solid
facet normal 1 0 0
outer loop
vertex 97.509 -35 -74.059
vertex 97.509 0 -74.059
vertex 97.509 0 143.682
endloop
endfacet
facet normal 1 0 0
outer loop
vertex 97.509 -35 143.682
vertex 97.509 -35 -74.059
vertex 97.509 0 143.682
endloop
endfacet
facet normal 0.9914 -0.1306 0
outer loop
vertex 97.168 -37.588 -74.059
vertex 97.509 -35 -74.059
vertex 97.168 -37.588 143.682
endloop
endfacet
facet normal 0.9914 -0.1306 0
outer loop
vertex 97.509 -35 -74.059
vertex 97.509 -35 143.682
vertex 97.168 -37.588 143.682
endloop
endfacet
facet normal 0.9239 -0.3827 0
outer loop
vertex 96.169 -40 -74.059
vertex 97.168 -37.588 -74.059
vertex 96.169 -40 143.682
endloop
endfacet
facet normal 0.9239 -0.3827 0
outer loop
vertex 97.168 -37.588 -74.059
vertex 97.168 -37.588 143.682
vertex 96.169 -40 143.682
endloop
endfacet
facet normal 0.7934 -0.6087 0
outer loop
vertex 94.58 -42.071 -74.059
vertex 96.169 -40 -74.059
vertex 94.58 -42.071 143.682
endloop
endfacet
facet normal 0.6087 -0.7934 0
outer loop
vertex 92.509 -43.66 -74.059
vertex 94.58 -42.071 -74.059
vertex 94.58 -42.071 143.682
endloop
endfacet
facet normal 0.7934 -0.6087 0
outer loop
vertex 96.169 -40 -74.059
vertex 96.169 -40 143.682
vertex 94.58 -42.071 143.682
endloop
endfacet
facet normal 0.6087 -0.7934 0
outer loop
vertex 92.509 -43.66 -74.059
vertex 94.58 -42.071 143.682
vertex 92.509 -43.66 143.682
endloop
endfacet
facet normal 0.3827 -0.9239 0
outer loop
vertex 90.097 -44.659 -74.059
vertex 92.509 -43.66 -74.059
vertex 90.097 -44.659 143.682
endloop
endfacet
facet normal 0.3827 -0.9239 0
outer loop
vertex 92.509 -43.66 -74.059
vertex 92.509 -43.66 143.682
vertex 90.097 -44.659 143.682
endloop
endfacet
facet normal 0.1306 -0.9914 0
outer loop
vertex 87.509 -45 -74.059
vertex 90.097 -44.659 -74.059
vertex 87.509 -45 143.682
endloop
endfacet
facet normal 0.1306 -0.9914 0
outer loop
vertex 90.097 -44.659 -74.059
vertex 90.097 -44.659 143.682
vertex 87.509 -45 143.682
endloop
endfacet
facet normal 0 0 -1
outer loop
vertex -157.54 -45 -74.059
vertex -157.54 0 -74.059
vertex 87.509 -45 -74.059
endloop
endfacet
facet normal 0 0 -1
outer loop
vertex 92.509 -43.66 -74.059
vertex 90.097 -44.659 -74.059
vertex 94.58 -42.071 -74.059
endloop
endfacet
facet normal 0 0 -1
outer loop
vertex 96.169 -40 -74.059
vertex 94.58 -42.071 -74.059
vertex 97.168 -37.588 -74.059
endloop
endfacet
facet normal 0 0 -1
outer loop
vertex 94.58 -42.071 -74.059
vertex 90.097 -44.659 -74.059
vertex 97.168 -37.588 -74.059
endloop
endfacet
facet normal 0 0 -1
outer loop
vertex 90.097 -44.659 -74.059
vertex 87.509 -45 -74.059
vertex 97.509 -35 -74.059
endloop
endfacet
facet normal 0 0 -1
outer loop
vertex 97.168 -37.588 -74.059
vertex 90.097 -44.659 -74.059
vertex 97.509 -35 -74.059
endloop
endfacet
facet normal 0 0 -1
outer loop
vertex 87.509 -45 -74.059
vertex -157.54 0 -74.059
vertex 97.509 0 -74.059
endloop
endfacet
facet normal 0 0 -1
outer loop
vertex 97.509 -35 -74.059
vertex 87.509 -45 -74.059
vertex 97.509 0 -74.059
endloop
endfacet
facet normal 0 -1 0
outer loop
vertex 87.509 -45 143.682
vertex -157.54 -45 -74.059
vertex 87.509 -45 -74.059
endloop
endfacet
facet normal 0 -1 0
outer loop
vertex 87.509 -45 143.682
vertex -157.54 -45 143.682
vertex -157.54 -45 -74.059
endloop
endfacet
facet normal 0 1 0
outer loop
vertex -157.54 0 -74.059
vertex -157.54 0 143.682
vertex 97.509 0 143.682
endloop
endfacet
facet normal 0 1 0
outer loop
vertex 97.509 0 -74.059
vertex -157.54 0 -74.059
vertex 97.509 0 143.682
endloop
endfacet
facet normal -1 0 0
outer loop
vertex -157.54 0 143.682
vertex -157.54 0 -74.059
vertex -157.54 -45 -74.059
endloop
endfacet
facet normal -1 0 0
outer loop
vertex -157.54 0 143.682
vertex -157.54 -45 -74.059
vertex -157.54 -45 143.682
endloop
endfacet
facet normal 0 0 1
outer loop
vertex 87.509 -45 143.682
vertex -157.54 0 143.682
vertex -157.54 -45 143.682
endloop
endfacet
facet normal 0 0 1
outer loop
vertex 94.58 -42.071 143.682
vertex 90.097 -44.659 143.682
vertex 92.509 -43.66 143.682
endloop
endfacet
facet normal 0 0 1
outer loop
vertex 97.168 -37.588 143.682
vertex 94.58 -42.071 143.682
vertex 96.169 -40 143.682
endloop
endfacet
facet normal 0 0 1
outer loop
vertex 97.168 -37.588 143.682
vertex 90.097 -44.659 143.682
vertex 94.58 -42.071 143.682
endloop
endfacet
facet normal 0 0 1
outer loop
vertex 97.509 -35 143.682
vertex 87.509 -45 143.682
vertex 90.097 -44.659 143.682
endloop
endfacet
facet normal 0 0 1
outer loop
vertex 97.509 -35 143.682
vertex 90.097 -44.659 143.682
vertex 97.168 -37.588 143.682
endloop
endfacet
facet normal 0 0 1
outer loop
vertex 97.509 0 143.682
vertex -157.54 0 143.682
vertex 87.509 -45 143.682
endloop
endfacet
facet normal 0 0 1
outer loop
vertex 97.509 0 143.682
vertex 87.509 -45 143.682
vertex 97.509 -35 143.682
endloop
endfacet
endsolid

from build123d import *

# Parameters (mm, degrees)
F0_W     = 255.0496831536
F0_H     = 217.740483582
F1_DEPTH = 45
F2_R     = 10


# Not quite as in the source:
# - the program builds the solid bodies; features that only make, move or delete a surface that nothing else refers to are left out


with BuildPart() as f1:
    # F0 (on Front) → F1 (new body)
    with BuildSketch(Plane.XZ):
        with Locations((-30.0156064332, 34.8116643727)):
            Rectangle(F0_W, F0_H)
    extrude(amount=F1_DEPTH)

    # F2
    f2_edges = [f1.edges().sort_by_distance(p)[0] for p in [
        (97.509235, -45, 34.811664),
    ]]
    fillet(f2_edges, radius=F2_R)


solid = f1.part
